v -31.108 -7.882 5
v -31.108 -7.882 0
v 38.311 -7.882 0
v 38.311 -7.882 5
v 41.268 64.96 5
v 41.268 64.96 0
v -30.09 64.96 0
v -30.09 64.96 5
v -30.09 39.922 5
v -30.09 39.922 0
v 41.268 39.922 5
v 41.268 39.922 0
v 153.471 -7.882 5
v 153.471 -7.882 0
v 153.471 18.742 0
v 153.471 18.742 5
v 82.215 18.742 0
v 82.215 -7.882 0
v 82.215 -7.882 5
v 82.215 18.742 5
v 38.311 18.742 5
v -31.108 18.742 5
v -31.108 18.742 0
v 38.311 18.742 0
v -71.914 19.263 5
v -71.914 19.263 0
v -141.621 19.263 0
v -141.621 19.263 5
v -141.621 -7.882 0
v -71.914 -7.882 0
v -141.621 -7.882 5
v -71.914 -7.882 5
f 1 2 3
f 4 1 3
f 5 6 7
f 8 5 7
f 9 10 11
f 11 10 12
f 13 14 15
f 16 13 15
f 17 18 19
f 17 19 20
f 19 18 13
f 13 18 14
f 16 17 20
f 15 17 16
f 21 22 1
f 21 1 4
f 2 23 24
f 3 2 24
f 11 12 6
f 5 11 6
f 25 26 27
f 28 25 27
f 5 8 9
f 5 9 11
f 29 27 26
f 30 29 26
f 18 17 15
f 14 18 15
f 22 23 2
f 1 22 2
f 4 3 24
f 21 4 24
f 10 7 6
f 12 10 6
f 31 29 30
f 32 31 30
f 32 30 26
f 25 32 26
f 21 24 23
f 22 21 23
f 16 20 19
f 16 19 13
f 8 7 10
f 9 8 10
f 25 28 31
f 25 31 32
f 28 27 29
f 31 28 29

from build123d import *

# Parameters (mm, degrees)
F0_W     = 71.255765
F0_H     = 26.623579
F1_DEPTH = 5


with BuildPart() as f1:
    # F0 (on Top) → F1 (new body)
    with BuildSketch(Plane.XY):
        Polygon((-71.913898, 19.263454), (-106.767256, 19.263454), (-141.620614, 19.263454), (-141.620614, -7.881644), (-71.913898, -7.881644), align=None)
        Polygon((41.26789, 64.960077), (-30.08987, 64.960077), (-30.08987, 39.922468), (3.601708, 39.922468), (41.26789, 39.922468), align=None)
        Polygon((38.310938, 18.741935), (3.601708, 18.741935), (-31.107523, 18.741935), (-31.107523, -7.881644), (38.310938, -7.881644), align=None)
        with Locations((117.843281, 5.430145)):
            Rectangle(F0_W, F0_H)
    extrude(amount=F1_DEPTH)


solid = f1.part
